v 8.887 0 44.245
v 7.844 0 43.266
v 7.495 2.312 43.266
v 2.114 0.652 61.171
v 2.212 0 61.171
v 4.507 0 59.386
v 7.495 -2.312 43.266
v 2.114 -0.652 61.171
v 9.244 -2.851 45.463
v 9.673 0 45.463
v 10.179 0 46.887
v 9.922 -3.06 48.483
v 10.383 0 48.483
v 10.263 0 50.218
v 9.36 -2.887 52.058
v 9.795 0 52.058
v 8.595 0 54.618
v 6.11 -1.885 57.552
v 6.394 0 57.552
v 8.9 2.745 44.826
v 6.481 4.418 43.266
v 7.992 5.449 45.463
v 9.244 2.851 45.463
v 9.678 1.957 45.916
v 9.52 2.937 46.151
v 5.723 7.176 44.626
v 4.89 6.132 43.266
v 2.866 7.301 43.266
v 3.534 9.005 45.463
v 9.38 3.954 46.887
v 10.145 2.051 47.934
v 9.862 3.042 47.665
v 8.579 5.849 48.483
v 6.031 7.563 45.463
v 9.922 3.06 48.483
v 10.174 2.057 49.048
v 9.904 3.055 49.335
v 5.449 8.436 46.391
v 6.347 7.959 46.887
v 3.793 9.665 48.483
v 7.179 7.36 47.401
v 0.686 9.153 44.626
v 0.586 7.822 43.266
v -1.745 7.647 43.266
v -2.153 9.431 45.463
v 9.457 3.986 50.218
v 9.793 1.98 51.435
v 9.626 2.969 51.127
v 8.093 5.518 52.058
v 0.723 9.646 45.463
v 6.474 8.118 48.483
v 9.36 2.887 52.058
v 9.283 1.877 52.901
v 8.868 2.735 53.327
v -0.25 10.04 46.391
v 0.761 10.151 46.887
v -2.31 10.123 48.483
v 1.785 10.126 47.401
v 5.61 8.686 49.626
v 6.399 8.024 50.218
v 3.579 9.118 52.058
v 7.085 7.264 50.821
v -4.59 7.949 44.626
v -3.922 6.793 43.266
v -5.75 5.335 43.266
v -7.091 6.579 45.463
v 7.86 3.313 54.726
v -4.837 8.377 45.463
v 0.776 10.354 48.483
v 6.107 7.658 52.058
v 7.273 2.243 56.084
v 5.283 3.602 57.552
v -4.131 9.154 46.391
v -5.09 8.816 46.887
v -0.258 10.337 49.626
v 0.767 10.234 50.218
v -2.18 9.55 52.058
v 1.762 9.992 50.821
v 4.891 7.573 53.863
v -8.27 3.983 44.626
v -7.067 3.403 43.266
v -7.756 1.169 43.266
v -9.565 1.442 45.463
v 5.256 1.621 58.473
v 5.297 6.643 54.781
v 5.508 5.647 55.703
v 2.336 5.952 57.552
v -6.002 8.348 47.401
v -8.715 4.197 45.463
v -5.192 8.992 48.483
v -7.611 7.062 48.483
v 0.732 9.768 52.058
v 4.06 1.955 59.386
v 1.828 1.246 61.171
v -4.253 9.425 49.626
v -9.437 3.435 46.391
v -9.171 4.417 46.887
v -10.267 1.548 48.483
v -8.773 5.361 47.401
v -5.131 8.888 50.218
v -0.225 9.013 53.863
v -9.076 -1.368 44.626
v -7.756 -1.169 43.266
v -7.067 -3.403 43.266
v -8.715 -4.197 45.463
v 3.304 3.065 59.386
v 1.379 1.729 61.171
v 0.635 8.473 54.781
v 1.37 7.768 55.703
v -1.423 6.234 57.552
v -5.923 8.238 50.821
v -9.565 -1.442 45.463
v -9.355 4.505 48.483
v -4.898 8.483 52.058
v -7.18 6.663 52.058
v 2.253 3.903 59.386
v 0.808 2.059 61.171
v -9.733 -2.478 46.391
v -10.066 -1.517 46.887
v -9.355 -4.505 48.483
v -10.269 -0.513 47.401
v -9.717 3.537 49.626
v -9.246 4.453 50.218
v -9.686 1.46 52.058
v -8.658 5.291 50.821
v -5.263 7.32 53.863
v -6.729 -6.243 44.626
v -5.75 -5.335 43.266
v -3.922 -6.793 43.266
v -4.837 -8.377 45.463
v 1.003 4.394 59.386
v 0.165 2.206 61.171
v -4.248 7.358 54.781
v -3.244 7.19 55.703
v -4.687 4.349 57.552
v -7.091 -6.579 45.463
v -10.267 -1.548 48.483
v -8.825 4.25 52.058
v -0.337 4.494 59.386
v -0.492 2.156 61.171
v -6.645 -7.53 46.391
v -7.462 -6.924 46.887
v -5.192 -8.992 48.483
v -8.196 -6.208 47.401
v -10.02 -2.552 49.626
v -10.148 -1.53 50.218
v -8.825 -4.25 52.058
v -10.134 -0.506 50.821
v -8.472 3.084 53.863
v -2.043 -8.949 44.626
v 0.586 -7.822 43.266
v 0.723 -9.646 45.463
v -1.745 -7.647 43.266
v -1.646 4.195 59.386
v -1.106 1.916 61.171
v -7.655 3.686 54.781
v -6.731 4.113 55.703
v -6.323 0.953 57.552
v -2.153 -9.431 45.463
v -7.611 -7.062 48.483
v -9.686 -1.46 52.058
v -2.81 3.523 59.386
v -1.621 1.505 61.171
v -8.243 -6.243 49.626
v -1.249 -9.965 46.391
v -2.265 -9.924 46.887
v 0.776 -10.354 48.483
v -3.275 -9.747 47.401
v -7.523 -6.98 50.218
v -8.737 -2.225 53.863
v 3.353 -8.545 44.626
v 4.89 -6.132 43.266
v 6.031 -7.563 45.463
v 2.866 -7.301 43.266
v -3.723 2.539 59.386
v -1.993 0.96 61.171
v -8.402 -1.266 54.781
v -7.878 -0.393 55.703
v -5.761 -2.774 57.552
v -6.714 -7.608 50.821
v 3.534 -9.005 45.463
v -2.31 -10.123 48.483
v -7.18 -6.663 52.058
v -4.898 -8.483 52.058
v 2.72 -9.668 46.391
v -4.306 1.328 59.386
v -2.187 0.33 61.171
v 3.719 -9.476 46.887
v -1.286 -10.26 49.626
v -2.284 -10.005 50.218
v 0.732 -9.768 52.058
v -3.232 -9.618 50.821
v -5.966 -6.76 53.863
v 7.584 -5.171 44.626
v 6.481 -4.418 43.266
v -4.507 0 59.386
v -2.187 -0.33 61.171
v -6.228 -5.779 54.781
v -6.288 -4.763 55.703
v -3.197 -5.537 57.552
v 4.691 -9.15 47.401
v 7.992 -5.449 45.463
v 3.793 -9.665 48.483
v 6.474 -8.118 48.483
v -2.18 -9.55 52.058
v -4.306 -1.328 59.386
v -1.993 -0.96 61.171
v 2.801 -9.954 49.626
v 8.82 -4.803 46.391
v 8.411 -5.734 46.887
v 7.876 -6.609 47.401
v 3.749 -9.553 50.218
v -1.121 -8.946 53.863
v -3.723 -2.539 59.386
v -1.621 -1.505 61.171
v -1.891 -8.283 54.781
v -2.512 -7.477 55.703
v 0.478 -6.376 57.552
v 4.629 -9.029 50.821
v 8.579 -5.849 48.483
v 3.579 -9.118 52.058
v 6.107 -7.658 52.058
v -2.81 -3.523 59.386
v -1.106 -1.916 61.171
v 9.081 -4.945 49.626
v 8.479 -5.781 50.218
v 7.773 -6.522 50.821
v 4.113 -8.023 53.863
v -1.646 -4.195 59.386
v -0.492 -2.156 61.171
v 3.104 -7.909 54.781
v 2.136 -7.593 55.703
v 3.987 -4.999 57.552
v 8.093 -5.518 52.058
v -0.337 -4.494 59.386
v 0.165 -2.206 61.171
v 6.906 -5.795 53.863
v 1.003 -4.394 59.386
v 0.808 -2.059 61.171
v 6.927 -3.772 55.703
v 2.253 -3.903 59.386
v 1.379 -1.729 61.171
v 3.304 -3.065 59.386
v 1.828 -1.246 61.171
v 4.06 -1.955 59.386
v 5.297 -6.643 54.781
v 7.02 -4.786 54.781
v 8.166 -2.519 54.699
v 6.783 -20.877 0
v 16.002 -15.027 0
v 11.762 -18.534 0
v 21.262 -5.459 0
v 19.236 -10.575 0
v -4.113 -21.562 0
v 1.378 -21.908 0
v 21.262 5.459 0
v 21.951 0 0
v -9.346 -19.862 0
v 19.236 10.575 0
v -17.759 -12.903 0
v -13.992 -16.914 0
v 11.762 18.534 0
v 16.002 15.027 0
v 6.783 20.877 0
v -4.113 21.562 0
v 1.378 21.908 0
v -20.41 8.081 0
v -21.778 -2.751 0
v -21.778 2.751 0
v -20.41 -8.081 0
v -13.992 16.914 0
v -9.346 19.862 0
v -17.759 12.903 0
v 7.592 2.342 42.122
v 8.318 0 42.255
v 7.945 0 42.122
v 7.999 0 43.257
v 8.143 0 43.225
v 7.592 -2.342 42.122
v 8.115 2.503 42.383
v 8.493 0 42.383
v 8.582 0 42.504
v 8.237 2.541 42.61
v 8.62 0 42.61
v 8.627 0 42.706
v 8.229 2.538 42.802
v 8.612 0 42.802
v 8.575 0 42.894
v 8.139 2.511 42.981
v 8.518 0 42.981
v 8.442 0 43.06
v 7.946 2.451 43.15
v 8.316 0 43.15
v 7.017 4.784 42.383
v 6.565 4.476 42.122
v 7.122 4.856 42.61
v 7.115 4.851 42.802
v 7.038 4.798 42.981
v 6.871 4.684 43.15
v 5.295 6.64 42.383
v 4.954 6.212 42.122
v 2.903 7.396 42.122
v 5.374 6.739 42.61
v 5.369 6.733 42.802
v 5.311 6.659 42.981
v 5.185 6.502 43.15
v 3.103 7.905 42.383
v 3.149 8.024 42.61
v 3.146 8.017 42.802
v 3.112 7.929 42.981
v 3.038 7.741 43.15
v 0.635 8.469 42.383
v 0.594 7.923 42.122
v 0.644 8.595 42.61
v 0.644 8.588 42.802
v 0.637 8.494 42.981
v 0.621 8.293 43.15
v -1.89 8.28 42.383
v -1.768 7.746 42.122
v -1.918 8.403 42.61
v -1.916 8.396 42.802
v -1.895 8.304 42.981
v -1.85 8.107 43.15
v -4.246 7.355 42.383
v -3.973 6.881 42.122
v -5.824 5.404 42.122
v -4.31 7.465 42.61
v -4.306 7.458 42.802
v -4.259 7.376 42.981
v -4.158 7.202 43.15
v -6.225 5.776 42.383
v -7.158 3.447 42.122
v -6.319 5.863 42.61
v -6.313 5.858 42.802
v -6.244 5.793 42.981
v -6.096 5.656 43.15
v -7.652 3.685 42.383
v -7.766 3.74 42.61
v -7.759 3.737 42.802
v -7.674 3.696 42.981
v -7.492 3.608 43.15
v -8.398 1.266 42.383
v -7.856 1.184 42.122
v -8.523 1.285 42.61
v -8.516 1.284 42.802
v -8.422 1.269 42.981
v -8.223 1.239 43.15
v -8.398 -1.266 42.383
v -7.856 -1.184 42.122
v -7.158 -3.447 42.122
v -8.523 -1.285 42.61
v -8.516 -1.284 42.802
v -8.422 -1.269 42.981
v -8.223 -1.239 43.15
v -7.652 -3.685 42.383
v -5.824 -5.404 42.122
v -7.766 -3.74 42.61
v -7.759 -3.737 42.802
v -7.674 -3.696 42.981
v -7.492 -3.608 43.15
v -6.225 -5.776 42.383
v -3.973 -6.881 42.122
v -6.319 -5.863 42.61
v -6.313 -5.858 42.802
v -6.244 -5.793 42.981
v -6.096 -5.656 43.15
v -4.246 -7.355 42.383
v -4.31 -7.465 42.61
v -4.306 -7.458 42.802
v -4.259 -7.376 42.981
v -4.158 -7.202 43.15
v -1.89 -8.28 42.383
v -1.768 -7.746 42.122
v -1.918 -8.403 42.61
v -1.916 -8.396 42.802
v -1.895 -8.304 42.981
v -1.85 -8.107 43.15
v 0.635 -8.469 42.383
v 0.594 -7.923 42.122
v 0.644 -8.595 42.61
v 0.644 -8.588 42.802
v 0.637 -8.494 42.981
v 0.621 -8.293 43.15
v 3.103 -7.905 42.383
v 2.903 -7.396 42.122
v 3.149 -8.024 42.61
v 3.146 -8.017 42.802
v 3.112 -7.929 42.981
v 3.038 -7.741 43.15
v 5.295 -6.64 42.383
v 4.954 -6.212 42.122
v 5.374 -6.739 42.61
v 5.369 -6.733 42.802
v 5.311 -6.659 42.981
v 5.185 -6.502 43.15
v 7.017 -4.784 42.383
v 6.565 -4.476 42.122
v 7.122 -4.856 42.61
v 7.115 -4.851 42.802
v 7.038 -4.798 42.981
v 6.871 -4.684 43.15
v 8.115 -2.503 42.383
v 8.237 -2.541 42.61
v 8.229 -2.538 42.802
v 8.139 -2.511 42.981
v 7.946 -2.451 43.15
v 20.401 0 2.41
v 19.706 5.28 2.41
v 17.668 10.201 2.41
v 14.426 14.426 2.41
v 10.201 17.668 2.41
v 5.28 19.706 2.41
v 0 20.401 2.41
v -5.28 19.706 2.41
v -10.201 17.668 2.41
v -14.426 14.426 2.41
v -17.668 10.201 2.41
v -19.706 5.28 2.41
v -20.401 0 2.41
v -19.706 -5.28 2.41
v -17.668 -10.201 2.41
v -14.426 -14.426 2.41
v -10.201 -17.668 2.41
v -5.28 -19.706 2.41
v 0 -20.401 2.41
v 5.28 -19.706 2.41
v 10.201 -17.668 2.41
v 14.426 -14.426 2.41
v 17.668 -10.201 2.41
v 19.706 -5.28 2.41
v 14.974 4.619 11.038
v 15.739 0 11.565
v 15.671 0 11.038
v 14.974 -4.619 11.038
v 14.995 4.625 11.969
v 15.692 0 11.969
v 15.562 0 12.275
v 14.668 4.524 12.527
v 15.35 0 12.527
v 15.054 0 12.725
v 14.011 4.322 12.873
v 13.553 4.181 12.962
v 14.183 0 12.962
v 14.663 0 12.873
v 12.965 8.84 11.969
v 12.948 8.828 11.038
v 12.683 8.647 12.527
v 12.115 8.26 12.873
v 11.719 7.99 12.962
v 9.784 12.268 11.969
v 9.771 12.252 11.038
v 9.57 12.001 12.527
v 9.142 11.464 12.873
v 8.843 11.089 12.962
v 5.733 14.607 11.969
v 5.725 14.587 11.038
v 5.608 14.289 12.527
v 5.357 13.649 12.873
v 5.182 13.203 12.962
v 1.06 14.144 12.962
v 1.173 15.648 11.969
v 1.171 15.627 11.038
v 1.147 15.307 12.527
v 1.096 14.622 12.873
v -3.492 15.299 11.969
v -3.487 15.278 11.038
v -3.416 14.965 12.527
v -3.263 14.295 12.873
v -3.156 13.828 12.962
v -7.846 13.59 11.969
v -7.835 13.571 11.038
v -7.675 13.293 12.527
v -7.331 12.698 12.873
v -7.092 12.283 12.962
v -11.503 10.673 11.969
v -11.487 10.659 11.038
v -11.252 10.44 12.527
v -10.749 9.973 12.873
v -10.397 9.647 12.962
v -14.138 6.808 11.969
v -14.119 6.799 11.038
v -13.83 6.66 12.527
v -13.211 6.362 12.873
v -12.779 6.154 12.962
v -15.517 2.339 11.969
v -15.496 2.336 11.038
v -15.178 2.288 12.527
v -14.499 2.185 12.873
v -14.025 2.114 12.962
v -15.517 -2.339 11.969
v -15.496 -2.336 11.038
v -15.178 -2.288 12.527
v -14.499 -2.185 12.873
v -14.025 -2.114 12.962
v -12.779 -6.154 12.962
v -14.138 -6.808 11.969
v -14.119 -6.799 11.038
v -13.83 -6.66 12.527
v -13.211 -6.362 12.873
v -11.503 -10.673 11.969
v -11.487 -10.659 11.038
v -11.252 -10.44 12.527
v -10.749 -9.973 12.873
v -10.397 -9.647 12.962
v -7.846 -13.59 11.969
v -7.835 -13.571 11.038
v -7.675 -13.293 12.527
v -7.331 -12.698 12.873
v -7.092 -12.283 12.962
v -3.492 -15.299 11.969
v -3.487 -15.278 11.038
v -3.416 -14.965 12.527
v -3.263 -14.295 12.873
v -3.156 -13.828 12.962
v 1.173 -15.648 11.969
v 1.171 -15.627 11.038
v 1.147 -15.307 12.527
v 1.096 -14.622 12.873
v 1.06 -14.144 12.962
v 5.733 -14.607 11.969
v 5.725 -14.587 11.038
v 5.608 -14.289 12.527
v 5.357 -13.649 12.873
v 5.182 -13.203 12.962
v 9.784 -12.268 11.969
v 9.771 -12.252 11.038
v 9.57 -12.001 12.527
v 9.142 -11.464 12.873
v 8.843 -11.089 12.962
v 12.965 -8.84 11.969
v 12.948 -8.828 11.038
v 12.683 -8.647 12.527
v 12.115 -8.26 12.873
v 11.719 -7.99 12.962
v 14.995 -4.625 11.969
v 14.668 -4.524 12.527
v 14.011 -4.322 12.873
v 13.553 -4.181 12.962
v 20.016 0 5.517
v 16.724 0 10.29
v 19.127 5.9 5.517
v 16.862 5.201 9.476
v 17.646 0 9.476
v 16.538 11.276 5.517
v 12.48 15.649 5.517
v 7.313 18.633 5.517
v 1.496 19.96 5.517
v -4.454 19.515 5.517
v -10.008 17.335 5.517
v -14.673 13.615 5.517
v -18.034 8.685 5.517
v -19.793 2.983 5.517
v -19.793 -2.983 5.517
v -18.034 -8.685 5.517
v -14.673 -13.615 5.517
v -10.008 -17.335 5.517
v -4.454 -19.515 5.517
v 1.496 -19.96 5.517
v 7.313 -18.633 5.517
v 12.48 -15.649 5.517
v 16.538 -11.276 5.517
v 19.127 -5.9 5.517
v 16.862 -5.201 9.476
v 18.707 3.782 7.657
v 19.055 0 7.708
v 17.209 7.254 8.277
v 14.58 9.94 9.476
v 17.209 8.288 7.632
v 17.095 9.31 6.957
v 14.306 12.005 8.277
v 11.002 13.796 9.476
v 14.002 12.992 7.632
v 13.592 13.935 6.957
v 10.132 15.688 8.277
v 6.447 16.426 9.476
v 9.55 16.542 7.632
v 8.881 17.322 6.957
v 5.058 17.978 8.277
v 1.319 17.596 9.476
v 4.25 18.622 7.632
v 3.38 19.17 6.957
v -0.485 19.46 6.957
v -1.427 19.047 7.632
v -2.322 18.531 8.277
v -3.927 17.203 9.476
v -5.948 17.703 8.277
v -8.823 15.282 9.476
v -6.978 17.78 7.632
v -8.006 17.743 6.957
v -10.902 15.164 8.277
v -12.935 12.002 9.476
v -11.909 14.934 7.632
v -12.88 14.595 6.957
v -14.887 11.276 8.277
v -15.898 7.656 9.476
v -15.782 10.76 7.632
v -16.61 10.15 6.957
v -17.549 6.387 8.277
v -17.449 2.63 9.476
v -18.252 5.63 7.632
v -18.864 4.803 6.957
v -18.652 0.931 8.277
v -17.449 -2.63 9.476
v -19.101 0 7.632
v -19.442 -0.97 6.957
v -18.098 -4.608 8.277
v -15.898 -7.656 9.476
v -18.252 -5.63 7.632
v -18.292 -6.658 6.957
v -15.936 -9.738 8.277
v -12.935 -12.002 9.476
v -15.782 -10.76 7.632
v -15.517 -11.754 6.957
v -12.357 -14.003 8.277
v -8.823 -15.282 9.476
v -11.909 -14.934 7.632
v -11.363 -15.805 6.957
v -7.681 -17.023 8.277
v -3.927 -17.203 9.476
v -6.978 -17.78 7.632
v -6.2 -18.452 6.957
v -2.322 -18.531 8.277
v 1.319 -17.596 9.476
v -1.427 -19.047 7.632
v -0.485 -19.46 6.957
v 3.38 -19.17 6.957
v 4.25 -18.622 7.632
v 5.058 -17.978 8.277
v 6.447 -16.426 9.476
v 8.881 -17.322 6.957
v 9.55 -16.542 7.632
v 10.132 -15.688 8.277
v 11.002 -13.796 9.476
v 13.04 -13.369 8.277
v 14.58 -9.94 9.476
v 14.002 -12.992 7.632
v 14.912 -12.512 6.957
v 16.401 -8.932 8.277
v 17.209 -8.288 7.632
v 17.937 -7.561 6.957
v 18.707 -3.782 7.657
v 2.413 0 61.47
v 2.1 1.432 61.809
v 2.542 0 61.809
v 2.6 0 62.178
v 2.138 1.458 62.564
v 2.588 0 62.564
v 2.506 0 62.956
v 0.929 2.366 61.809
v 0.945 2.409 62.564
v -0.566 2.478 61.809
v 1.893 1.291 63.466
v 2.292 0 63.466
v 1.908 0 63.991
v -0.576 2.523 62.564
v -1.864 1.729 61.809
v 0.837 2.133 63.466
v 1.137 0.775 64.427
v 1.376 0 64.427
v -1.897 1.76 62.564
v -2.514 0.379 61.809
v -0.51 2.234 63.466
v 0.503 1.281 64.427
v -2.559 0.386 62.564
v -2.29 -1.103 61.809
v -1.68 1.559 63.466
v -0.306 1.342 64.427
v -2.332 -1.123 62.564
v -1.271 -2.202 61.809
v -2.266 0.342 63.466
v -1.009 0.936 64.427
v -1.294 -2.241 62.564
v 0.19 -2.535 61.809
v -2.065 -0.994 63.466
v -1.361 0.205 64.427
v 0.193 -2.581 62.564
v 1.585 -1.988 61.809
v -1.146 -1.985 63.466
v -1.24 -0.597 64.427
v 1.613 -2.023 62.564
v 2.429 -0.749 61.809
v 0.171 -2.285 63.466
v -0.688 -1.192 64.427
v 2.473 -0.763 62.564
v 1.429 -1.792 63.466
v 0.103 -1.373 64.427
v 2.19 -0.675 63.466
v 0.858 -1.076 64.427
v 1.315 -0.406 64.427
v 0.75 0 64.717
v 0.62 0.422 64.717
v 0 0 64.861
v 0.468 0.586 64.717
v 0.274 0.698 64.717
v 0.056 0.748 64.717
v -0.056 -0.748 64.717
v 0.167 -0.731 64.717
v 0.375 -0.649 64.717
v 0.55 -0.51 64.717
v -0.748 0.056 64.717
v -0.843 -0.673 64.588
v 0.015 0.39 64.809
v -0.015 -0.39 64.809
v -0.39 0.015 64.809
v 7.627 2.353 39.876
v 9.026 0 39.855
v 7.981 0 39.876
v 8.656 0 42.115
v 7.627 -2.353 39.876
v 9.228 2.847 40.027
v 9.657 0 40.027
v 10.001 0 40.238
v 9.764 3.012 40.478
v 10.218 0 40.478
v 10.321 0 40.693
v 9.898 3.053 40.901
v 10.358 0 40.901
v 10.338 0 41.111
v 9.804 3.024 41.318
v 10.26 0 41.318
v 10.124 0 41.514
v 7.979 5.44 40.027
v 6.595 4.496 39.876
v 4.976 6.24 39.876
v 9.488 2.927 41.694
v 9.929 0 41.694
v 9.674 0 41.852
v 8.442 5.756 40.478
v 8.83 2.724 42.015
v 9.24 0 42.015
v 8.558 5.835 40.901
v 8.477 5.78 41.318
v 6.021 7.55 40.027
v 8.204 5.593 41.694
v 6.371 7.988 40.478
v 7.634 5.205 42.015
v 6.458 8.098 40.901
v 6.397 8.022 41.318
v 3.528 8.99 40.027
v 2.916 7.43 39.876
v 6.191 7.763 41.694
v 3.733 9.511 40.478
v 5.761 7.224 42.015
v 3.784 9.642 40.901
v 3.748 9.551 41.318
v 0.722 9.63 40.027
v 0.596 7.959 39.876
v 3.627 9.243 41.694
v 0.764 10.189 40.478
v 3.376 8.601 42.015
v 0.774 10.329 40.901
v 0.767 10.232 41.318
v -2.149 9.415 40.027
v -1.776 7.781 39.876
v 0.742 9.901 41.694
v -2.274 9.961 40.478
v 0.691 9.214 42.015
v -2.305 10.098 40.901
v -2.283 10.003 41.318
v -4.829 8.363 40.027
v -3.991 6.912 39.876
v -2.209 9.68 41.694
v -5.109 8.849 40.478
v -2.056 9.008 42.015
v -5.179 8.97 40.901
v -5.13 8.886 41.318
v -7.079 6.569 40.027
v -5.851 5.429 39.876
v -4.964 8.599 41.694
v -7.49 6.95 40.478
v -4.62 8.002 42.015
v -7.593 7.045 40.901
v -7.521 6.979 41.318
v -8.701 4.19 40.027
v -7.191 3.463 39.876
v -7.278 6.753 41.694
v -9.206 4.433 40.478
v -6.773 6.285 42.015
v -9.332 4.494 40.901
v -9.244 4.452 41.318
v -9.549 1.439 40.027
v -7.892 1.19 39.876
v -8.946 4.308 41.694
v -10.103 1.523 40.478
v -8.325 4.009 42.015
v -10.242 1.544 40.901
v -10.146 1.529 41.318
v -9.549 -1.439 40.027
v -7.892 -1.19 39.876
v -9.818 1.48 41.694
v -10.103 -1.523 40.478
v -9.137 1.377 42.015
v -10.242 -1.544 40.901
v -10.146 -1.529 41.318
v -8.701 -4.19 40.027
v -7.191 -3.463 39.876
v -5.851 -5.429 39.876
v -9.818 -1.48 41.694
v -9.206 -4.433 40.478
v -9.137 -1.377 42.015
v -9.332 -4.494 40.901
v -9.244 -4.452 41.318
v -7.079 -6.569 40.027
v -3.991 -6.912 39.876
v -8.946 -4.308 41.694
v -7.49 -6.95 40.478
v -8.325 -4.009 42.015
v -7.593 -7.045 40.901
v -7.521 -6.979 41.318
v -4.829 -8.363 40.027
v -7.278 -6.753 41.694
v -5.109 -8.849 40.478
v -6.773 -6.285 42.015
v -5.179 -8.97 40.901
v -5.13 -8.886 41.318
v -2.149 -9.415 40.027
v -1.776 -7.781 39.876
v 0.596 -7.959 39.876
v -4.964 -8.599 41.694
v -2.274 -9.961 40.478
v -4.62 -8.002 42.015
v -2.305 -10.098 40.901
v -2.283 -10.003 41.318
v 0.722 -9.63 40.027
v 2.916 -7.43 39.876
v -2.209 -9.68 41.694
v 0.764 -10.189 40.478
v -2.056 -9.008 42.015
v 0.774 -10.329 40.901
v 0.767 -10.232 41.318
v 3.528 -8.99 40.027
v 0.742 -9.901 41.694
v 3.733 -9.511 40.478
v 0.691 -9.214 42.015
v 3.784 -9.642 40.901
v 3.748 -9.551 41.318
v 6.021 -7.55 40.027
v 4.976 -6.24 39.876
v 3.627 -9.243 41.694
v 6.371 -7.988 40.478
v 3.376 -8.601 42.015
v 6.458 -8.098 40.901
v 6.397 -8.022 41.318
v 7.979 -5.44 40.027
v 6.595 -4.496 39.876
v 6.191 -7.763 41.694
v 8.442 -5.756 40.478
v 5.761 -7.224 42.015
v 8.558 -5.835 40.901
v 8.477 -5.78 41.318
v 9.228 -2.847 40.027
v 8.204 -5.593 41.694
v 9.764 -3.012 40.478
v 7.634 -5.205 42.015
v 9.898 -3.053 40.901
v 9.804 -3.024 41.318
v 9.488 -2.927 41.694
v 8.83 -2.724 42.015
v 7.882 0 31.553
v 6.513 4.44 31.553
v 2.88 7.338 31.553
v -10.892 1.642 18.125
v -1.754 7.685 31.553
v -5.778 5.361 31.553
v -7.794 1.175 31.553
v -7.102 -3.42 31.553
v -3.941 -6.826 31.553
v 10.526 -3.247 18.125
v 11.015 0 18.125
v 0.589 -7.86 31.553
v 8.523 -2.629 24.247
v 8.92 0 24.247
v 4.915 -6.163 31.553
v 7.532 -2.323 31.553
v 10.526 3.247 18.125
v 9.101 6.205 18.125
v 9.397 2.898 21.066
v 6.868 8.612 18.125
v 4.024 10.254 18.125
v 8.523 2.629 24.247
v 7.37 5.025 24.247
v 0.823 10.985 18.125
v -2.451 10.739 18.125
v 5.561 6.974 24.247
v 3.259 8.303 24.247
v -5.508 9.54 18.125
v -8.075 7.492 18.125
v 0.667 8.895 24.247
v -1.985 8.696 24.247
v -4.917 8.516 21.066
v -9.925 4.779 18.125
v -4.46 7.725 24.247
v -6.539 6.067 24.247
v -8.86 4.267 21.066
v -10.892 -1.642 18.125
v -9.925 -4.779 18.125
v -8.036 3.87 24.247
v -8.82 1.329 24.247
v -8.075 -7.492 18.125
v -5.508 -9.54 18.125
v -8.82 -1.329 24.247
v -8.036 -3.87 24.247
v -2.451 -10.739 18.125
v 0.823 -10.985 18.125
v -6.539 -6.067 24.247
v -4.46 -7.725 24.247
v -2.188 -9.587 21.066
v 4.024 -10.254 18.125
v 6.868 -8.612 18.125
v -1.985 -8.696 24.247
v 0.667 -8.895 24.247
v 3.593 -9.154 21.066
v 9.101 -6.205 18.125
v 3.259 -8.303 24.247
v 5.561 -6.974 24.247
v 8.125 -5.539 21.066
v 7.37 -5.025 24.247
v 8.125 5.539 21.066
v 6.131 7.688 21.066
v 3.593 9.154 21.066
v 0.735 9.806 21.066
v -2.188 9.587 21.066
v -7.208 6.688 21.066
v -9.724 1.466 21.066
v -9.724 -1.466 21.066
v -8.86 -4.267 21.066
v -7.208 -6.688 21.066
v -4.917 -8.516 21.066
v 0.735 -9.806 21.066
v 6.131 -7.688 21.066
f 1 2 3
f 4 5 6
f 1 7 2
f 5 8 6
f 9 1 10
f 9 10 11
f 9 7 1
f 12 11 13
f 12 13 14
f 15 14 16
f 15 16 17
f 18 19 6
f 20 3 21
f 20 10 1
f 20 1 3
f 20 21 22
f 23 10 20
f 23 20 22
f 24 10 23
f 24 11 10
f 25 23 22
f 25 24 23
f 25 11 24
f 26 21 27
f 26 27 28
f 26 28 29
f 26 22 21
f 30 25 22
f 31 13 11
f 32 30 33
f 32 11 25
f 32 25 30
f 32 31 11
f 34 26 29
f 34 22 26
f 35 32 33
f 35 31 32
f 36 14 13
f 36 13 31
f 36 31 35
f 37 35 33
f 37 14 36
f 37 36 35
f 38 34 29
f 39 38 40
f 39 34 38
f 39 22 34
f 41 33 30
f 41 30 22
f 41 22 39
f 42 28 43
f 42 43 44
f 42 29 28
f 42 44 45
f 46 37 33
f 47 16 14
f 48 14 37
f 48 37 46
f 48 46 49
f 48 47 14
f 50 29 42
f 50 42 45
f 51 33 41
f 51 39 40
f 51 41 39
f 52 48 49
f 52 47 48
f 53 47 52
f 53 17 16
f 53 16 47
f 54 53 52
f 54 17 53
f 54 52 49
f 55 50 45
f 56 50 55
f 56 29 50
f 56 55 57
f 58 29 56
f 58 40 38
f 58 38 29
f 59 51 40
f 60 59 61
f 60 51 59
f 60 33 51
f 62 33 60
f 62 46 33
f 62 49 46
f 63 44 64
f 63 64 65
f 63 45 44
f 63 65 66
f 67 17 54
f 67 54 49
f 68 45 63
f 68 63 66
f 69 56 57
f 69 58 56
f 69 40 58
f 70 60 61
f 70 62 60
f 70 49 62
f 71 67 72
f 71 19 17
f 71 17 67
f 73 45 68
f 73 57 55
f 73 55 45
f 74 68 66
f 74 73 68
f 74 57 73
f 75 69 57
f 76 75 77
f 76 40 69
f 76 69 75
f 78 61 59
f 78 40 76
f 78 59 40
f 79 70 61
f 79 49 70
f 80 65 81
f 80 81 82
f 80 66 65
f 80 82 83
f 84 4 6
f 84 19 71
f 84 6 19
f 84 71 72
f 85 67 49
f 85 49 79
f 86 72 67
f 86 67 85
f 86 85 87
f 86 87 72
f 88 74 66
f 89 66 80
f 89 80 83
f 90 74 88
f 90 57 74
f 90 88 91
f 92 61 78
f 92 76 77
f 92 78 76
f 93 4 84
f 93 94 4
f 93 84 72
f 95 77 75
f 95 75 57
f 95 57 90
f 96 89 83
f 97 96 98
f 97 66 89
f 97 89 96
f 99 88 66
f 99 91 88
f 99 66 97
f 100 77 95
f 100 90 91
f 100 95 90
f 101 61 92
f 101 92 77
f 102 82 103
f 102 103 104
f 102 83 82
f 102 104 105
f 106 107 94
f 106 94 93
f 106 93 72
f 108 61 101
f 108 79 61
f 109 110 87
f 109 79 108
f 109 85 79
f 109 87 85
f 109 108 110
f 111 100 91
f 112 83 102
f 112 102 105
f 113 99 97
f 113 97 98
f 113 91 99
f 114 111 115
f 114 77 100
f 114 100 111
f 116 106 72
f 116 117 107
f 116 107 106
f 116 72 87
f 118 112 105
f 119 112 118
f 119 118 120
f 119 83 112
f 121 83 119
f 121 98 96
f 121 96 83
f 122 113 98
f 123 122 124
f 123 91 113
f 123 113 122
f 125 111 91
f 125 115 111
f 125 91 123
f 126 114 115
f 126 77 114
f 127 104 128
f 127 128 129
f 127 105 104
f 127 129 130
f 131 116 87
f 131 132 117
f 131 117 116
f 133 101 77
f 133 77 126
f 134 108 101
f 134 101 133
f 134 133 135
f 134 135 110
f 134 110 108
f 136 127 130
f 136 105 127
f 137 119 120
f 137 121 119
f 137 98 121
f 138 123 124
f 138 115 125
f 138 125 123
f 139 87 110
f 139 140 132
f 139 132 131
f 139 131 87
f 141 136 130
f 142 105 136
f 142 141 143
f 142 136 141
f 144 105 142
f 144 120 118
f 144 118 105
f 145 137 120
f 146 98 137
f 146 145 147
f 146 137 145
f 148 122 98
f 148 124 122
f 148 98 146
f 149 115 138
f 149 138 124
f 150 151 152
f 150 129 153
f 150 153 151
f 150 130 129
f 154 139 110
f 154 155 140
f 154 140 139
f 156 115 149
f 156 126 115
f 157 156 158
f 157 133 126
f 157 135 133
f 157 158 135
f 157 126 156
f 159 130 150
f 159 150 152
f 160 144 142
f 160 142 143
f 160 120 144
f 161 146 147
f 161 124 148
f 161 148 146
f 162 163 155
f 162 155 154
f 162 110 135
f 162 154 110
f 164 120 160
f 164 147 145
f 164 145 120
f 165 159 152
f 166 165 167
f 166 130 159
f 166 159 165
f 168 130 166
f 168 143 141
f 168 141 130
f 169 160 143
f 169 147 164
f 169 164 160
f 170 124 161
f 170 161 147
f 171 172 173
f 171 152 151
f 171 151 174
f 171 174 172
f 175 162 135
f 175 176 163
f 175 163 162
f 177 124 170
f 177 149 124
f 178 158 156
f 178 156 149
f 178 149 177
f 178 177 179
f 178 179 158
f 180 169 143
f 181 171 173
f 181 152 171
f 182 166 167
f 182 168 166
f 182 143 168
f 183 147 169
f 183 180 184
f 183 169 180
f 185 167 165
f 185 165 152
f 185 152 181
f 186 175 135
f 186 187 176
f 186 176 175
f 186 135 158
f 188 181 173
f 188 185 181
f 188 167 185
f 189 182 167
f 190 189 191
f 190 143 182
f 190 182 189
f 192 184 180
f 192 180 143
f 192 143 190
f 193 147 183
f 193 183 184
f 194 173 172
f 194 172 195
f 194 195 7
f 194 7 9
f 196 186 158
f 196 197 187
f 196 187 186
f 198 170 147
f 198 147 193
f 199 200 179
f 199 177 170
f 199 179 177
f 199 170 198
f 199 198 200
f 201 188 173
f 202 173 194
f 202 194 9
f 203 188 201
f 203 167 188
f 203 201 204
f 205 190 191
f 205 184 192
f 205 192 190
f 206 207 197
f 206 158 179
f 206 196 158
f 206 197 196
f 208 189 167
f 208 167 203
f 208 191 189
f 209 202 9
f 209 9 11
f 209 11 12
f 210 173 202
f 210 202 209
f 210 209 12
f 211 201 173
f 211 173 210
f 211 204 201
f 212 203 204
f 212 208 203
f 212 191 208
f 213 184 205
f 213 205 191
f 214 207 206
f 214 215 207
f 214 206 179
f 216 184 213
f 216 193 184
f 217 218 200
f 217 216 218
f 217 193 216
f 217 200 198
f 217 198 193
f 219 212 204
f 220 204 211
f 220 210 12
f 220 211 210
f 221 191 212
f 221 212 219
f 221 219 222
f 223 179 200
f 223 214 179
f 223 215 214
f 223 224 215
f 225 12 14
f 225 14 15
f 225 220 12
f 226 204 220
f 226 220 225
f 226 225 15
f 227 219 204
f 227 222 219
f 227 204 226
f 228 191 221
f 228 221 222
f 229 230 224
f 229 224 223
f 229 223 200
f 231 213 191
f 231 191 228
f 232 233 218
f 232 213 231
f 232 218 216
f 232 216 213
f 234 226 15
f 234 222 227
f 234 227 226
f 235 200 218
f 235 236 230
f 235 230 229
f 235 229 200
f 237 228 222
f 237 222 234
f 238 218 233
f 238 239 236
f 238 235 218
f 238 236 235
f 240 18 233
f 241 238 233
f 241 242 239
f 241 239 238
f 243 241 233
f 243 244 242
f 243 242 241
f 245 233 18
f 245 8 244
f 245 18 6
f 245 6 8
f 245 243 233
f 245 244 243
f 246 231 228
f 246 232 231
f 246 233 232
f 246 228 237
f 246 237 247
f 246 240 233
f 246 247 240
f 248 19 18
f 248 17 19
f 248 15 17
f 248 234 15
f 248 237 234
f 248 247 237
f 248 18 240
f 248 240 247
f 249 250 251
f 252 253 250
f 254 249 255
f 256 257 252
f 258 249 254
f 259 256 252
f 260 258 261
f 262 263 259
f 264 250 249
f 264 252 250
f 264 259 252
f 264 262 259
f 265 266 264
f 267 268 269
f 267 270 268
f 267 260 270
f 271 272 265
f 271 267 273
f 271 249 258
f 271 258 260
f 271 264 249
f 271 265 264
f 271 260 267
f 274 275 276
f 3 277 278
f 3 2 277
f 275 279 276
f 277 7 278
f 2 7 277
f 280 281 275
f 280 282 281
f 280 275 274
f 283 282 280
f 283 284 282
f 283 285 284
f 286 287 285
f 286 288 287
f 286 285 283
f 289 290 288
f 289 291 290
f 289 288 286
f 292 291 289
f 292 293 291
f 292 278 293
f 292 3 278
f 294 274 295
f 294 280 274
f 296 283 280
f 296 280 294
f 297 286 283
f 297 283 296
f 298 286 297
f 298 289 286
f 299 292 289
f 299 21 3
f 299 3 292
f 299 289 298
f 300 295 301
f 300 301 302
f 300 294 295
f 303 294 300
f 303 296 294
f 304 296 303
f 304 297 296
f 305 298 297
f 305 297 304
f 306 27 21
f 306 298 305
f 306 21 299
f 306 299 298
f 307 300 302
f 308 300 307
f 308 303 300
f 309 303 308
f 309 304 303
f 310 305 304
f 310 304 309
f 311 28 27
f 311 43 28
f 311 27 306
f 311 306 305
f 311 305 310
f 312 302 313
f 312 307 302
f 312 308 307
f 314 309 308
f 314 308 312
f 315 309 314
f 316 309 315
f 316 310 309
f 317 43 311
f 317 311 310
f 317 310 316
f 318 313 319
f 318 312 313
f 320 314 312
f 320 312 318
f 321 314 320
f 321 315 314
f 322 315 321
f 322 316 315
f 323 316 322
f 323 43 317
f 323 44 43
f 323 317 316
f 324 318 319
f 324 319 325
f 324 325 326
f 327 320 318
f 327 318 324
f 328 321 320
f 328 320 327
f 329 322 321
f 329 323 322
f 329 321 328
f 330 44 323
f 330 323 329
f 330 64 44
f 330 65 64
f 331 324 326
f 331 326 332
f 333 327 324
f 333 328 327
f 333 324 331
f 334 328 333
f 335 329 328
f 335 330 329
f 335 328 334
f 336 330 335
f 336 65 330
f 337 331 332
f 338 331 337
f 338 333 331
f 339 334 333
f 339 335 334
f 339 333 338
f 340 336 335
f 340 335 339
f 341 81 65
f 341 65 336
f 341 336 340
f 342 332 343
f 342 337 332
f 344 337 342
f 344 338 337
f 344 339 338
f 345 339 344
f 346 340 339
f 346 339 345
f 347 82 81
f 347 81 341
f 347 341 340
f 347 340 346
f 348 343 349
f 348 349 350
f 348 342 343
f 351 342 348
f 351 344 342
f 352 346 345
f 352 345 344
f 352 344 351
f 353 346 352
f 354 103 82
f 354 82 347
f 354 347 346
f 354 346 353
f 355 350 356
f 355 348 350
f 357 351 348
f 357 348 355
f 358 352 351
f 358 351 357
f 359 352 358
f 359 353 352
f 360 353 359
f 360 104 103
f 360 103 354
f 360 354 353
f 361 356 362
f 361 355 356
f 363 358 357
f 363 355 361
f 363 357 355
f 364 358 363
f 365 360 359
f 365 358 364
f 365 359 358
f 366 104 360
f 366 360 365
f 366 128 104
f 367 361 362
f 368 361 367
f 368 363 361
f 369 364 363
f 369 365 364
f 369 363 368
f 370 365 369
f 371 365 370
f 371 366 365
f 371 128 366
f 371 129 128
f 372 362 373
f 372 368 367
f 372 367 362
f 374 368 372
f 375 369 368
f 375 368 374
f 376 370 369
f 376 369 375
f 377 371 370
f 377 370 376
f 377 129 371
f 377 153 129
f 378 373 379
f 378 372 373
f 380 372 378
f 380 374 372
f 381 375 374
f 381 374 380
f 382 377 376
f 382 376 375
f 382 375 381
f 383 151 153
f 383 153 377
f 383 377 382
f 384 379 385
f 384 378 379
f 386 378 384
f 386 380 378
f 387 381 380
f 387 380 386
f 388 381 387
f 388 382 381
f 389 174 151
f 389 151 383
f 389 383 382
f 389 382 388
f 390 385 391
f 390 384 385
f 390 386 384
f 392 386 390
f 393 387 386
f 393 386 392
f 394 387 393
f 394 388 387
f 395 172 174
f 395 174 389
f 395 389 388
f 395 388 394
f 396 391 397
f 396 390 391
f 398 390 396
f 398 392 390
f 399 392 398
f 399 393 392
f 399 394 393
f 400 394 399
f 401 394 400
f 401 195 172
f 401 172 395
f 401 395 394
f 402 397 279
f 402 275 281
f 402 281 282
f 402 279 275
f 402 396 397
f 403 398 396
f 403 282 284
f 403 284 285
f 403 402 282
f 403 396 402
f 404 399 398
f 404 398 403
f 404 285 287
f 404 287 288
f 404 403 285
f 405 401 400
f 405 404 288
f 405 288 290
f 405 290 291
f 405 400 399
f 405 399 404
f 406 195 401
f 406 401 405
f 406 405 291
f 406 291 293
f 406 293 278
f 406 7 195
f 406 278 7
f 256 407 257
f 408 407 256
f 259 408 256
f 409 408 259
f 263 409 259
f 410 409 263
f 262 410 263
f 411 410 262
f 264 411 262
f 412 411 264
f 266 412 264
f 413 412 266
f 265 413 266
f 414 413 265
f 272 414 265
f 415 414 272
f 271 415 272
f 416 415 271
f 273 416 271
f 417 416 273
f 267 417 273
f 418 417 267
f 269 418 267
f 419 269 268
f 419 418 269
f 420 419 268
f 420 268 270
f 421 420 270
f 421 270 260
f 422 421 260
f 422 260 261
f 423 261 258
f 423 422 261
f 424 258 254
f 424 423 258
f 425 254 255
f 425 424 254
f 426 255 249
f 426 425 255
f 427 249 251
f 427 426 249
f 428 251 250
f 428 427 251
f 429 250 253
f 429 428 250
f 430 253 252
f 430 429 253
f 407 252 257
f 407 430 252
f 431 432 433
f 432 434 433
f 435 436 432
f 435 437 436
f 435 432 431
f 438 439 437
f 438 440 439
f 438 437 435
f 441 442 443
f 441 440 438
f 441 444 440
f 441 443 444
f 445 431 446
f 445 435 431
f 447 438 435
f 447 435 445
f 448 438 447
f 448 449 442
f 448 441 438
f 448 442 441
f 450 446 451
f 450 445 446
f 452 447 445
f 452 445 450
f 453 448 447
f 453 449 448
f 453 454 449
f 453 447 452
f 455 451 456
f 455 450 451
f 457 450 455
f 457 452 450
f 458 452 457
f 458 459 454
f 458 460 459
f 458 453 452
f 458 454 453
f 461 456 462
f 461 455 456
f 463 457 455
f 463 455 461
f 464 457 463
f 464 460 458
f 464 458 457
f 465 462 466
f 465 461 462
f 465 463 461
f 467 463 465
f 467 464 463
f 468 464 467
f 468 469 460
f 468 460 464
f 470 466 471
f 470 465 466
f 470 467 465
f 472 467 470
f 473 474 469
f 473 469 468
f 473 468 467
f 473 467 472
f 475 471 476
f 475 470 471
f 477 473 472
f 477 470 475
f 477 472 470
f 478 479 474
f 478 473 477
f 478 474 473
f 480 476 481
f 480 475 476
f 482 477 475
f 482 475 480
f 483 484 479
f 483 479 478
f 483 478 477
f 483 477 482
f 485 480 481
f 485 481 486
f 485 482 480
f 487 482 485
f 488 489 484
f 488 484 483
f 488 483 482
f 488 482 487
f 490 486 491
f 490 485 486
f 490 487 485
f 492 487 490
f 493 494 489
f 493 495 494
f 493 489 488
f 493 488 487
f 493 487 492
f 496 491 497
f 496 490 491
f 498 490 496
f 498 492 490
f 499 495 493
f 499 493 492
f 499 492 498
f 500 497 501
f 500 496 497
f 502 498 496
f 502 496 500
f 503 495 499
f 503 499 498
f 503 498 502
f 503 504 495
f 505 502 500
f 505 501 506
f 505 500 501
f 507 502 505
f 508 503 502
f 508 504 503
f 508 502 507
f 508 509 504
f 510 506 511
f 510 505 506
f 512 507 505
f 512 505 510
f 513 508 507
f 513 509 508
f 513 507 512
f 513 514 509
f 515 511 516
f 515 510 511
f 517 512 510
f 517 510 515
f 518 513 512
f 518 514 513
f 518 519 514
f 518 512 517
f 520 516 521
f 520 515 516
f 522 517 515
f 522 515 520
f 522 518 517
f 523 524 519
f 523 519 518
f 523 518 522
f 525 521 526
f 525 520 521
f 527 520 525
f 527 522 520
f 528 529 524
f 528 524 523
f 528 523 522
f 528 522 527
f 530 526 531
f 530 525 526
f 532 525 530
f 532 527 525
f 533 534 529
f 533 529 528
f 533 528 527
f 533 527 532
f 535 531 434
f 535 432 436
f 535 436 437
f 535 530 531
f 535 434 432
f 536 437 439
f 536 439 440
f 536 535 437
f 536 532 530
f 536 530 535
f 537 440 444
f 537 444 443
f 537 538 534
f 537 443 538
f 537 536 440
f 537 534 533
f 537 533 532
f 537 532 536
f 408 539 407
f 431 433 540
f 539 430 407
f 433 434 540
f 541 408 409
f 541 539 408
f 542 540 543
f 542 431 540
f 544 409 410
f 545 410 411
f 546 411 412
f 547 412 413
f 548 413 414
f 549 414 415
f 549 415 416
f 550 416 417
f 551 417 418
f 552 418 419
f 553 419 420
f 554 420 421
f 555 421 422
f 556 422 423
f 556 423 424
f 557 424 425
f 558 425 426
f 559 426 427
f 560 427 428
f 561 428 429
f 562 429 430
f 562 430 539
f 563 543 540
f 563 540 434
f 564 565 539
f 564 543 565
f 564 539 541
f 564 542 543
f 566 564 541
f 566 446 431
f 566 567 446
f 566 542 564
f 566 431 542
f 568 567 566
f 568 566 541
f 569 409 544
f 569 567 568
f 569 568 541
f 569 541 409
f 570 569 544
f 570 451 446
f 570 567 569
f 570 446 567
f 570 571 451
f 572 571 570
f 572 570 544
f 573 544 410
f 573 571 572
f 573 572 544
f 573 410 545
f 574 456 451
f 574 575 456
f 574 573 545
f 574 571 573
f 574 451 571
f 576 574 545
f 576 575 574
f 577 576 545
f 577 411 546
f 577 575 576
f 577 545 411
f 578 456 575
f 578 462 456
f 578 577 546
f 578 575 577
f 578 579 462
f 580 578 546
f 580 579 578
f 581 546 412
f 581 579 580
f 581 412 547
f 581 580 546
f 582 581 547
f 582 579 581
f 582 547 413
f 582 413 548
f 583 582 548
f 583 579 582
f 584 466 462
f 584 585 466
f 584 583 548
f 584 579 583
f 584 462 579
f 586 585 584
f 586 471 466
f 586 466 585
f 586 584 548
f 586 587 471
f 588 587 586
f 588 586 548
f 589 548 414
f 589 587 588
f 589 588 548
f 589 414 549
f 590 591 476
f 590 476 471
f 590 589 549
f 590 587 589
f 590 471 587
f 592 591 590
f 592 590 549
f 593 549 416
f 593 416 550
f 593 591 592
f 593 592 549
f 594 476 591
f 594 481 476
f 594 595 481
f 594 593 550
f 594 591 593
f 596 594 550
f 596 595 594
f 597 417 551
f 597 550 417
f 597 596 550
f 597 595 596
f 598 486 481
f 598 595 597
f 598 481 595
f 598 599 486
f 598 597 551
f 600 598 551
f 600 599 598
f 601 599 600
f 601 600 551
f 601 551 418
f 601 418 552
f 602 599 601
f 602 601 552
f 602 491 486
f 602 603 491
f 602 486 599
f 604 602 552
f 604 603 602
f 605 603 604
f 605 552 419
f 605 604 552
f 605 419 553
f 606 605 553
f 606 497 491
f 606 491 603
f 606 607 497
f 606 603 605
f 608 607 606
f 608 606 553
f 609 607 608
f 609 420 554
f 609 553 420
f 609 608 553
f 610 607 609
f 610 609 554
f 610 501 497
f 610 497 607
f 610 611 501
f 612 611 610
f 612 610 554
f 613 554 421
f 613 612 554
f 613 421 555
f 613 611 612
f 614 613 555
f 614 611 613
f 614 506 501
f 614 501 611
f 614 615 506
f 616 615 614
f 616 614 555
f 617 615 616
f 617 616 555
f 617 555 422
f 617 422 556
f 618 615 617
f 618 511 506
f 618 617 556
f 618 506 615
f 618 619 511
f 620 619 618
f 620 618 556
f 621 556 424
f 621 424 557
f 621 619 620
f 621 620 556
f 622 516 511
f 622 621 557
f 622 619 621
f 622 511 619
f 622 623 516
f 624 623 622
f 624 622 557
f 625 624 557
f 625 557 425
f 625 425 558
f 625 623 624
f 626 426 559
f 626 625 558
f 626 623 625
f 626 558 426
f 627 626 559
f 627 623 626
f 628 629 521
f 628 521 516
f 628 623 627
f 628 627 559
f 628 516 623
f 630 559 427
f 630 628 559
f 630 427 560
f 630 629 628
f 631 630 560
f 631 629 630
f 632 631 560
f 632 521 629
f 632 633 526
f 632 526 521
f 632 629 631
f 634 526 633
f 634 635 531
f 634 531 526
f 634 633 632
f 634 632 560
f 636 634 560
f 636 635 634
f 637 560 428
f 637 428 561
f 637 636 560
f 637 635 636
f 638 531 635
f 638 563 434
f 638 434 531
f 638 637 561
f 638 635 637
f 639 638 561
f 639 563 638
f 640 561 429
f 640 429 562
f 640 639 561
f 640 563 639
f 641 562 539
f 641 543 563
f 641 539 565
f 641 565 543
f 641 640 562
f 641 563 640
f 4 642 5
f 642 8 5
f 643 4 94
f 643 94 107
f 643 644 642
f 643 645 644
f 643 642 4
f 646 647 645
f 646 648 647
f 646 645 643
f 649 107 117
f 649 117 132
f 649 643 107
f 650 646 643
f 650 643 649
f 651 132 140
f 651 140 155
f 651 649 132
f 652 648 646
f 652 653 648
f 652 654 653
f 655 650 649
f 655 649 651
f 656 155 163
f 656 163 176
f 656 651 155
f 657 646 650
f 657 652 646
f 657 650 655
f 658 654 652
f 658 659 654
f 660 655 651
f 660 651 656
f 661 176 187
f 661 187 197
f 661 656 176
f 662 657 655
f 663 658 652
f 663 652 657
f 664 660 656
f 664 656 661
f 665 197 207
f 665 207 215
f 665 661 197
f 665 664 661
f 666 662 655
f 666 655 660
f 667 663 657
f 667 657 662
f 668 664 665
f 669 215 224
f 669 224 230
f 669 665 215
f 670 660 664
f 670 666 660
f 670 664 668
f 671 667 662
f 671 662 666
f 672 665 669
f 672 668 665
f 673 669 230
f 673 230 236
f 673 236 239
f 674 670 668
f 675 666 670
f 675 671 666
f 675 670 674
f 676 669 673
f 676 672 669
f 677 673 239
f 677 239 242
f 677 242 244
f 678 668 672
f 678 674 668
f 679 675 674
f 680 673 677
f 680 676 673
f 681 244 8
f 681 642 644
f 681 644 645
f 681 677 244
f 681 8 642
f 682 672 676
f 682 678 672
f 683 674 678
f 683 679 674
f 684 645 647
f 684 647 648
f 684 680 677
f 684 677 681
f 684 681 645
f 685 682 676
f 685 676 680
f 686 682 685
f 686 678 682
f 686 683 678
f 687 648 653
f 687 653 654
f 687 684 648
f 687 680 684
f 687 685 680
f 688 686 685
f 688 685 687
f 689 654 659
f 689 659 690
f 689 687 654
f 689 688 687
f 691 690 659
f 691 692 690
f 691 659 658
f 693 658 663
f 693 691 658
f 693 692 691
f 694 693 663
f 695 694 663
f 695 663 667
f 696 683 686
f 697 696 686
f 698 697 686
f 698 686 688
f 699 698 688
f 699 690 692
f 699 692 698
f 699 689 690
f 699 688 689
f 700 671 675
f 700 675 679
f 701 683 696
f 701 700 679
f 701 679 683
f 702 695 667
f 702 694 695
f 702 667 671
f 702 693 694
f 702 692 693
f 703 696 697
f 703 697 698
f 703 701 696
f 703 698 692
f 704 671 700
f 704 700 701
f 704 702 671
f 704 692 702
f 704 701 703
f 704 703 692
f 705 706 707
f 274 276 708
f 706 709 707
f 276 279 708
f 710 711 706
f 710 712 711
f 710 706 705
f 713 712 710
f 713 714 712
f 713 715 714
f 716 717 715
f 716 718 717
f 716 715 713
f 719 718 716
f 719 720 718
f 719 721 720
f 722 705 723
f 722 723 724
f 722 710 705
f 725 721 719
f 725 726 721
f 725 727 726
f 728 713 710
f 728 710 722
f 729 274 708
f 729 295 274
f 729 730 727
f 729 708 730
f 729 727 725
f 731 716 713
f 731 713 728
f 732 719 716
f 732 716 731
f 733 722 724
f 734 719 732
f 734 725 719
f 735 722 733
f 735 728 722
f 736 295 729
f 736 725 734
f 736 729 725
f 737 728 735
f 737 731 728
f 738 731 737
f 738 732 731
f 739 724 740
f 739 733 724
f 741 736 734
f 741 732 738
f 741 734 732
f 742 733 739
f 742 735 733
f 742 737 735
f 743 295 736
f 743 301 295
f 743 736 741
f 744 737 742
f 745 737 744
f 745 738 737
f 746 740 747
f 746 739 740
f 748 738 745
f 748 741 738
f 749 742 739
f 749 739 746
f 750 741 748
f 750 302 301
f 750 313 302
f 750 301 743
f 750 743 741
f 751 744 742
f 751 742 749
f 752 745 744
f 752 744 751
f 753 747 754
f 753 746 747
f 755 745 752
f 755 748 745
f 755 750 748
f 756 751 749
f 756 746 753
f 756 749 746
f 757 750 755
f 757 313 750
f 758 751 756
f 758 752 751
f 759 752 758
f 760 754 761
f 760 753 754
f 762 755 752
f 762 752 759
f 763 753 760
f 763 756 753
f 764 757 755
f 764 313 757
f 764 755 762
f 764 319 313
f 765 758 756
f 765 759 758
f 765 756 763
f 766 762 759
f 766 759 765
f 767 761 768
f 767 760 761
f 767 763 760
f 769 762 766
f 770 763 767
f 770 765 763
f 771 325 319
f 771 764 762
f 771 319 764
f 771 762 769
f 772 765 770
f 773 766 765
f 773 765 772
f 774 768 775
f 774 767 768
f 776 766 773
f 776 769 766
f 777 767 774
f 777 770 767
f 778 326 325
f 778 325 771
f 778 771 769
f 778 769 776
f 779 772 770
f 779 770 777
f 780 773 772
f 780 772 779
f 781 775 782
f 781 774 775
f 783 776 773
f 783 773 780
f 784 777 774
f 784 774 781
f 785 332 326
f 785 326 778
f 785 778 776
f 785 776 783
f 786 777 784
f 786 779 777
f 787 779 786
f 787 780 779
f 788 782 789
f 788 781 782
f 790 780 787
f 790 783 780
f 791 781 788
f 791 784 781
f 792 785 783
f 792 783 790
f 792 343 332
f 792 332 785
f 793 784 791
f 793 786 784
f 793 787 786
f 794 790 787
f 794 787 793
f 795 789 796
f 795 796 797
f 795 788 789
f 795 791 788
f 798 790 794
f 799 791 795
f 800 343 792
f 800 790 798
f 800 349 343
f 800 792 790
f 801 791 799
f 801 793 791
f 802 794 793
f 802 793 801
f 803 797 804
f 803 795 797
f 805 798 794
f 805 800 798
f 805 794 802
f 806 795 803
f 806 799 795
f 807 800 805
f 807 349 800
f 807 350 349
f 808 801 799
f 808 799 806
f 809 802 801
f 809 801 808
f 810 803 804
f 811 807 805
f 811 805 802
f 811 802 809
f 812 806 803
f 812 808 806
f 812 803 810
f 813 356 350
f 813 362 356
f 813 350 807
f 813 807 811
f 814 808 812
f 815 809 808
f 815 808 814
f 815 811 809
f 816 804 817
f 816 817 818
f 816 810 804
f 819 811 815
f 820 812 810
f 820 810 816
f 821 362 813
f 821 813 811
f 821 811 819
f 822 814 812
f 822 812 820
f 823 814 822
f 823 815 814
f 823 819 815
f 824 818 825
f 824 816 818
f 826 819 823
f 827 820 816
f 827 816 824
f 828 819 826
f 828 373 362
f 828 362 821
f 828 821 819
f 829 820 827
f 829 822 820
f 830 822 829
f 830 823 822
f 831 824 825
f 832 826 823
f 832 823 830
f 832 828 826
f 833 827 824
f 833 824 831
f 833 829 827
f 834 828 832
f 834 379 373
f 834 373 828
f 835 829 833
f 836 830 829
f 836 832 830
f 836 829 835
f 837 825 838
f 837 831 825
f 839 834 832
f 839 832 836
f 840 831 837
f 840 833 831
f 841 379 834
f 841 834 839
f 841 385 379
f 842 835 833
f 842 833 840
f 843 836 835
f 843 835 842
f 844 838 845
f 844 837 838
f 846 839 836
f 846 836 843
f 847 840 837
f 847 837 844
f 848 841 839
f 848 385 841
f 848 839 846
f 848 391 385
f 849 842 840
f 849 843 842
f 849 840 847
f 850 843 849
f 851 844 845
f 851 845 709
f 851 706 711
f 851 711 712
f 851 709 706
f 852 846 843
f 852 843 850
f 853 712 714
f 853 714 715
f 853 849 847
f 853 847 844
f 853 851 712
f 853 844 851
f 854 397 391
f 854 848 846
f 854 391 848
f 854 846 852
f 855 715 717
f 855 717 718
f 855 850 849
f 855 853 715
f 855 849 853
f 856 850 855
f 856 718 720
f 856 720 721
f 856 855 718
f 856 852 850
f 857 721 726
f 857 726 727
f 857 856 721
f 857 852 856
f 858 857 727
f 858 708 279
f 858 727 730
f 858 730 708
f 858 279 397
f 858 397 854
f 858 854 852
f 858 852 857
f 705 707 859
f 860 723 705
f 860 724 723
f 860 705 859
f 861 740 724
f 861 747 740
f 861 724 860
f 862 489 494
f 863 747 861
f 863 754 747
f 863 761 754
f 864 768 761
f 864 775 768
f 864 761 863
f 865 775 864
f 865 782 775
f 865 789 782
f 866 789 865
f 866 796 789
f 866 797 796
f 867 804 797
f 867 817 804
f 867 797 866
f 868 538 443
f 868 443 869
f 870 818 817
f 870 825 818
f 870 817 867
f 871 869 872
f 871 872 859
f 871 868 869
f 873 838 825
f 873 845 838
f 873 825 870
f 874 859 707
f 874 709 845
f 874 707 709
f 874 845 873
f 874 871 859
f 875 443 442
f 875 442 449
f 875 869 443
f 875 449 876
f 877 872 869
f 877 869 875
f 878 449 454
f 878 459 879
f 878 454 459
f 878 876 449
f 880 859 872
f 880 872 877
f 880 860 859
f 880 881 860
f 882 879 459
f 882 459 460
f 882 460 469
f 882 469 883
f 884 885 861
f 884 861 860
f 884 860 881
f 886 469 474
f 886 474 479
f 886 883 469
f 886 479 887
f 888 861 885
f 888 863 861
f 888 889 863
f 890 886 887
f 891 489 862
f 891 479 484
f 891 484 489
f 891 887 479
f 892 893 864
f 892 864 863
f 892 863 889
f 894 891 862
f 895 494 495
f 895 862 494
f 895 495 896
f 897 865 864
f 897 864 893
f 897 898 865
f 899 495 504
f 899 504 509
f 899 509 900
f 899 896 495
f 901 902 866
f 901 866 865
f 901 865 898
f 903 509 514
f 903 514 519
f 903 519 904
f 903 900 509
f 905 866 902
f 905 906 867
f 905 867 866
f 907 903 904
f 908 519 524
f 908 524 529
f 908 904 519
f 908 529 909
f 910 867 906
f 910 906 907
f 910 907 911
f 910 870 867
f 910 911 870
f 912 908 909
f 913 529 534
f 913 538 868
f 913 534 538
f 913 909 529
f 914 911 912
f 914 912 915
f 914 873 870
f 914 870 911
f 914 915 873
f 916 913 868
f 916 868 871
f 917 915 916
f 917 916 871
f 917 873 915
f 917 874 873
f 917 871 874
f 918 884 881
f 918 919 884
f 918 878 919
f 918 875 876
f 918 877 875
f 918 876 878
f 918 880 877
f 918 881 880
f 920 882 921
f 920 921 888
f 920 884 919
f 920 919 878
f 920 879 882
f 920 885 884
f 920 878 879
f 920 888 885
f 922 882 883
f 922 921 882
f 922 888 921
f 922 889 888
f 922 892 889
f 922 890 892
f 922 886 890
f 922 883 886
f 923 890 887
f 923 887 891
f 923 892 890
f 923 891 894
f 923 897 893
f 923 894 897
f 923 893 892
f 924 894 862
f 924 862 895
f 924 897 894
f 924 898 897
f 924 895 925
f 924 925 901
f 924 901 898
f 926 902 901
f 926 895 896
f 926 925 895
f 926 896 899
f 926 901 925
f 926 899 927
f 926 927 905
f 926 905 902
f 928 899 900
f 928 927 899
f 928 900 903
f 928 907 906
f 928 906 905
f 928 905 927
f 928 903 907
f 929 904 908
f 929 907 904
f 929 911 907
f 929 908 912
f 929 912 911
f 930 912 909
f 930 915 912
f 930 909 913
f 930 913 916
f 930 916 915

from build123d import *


with BuildPart() as part:
    # Sketch → Revolve (revolve)
    with BuildSketch(Plane.XZ):
        with BuildLine():
            Line((0, 0), (21.951151, 0))
            Line((21.951151, 0), (20.4013, 2.40979))
            add(Edge.make_bspline(
                [(20.4013, 2.40979), (20.4986, 7.95886), (15.6707, 11.0375)],
                knots=[0, 0, 0, 1, 1, 1], degree=2))
            add(Edge.make_bspline(
                [(15.6707, 11.0375), (16.0644, 12.743477), (14.1834, 12.9622)],
                knots=[0, 0, 0, 1, 1, 1], degree=2))
            add(Edge.make_bspline(
                [(14.1834, 12.9622), (6.666199, 22.464972), (7.98136, 39.875568)],
                knots=[0, 0, 0, 1, 1, 1], degree=2))
            add(Edge.make_bspline(
                [(7.98136, 39.875568), (11.045922, 39.425156), (11.266711, 42.321918), (7.945098, 42.12191)],
                knots=[0, 0, 0, 0, 1, 1, 1, 1], degree=3))
            add(Edge.make_bspline(
                [(7.945098, 42.12191), (9.065896, 42.370265), (8.643517, 43.276684), (7.843672, 43.266373)],
                knots=[0, 0, 0, 0, 1, 1, 1, 1], degree=3))
            add(Edge.make_bspline(
                [(7.843672, 43.266373), (12.010397, 46.298336), (11.660451, 54.565788), (2.21194, 61.171)],
                knots=[0, 0, 0, 0, 1, 1, 1, 1], degree=3))
            add(Edge.make_bspline(
                [(2.21194, 61.171), (3.17245, 62.28), (2.341333, 64.685913), (0, 64.8609)],
                knots=[0, 0, 0, 0, 1, 1, 1, 1], degree=3))
            Line((0, 64.8609), (0, 0))
        make_face()
    revolve(axis=Axis((0, 0, 0), (0, 0, 1)))


solid = part.part
